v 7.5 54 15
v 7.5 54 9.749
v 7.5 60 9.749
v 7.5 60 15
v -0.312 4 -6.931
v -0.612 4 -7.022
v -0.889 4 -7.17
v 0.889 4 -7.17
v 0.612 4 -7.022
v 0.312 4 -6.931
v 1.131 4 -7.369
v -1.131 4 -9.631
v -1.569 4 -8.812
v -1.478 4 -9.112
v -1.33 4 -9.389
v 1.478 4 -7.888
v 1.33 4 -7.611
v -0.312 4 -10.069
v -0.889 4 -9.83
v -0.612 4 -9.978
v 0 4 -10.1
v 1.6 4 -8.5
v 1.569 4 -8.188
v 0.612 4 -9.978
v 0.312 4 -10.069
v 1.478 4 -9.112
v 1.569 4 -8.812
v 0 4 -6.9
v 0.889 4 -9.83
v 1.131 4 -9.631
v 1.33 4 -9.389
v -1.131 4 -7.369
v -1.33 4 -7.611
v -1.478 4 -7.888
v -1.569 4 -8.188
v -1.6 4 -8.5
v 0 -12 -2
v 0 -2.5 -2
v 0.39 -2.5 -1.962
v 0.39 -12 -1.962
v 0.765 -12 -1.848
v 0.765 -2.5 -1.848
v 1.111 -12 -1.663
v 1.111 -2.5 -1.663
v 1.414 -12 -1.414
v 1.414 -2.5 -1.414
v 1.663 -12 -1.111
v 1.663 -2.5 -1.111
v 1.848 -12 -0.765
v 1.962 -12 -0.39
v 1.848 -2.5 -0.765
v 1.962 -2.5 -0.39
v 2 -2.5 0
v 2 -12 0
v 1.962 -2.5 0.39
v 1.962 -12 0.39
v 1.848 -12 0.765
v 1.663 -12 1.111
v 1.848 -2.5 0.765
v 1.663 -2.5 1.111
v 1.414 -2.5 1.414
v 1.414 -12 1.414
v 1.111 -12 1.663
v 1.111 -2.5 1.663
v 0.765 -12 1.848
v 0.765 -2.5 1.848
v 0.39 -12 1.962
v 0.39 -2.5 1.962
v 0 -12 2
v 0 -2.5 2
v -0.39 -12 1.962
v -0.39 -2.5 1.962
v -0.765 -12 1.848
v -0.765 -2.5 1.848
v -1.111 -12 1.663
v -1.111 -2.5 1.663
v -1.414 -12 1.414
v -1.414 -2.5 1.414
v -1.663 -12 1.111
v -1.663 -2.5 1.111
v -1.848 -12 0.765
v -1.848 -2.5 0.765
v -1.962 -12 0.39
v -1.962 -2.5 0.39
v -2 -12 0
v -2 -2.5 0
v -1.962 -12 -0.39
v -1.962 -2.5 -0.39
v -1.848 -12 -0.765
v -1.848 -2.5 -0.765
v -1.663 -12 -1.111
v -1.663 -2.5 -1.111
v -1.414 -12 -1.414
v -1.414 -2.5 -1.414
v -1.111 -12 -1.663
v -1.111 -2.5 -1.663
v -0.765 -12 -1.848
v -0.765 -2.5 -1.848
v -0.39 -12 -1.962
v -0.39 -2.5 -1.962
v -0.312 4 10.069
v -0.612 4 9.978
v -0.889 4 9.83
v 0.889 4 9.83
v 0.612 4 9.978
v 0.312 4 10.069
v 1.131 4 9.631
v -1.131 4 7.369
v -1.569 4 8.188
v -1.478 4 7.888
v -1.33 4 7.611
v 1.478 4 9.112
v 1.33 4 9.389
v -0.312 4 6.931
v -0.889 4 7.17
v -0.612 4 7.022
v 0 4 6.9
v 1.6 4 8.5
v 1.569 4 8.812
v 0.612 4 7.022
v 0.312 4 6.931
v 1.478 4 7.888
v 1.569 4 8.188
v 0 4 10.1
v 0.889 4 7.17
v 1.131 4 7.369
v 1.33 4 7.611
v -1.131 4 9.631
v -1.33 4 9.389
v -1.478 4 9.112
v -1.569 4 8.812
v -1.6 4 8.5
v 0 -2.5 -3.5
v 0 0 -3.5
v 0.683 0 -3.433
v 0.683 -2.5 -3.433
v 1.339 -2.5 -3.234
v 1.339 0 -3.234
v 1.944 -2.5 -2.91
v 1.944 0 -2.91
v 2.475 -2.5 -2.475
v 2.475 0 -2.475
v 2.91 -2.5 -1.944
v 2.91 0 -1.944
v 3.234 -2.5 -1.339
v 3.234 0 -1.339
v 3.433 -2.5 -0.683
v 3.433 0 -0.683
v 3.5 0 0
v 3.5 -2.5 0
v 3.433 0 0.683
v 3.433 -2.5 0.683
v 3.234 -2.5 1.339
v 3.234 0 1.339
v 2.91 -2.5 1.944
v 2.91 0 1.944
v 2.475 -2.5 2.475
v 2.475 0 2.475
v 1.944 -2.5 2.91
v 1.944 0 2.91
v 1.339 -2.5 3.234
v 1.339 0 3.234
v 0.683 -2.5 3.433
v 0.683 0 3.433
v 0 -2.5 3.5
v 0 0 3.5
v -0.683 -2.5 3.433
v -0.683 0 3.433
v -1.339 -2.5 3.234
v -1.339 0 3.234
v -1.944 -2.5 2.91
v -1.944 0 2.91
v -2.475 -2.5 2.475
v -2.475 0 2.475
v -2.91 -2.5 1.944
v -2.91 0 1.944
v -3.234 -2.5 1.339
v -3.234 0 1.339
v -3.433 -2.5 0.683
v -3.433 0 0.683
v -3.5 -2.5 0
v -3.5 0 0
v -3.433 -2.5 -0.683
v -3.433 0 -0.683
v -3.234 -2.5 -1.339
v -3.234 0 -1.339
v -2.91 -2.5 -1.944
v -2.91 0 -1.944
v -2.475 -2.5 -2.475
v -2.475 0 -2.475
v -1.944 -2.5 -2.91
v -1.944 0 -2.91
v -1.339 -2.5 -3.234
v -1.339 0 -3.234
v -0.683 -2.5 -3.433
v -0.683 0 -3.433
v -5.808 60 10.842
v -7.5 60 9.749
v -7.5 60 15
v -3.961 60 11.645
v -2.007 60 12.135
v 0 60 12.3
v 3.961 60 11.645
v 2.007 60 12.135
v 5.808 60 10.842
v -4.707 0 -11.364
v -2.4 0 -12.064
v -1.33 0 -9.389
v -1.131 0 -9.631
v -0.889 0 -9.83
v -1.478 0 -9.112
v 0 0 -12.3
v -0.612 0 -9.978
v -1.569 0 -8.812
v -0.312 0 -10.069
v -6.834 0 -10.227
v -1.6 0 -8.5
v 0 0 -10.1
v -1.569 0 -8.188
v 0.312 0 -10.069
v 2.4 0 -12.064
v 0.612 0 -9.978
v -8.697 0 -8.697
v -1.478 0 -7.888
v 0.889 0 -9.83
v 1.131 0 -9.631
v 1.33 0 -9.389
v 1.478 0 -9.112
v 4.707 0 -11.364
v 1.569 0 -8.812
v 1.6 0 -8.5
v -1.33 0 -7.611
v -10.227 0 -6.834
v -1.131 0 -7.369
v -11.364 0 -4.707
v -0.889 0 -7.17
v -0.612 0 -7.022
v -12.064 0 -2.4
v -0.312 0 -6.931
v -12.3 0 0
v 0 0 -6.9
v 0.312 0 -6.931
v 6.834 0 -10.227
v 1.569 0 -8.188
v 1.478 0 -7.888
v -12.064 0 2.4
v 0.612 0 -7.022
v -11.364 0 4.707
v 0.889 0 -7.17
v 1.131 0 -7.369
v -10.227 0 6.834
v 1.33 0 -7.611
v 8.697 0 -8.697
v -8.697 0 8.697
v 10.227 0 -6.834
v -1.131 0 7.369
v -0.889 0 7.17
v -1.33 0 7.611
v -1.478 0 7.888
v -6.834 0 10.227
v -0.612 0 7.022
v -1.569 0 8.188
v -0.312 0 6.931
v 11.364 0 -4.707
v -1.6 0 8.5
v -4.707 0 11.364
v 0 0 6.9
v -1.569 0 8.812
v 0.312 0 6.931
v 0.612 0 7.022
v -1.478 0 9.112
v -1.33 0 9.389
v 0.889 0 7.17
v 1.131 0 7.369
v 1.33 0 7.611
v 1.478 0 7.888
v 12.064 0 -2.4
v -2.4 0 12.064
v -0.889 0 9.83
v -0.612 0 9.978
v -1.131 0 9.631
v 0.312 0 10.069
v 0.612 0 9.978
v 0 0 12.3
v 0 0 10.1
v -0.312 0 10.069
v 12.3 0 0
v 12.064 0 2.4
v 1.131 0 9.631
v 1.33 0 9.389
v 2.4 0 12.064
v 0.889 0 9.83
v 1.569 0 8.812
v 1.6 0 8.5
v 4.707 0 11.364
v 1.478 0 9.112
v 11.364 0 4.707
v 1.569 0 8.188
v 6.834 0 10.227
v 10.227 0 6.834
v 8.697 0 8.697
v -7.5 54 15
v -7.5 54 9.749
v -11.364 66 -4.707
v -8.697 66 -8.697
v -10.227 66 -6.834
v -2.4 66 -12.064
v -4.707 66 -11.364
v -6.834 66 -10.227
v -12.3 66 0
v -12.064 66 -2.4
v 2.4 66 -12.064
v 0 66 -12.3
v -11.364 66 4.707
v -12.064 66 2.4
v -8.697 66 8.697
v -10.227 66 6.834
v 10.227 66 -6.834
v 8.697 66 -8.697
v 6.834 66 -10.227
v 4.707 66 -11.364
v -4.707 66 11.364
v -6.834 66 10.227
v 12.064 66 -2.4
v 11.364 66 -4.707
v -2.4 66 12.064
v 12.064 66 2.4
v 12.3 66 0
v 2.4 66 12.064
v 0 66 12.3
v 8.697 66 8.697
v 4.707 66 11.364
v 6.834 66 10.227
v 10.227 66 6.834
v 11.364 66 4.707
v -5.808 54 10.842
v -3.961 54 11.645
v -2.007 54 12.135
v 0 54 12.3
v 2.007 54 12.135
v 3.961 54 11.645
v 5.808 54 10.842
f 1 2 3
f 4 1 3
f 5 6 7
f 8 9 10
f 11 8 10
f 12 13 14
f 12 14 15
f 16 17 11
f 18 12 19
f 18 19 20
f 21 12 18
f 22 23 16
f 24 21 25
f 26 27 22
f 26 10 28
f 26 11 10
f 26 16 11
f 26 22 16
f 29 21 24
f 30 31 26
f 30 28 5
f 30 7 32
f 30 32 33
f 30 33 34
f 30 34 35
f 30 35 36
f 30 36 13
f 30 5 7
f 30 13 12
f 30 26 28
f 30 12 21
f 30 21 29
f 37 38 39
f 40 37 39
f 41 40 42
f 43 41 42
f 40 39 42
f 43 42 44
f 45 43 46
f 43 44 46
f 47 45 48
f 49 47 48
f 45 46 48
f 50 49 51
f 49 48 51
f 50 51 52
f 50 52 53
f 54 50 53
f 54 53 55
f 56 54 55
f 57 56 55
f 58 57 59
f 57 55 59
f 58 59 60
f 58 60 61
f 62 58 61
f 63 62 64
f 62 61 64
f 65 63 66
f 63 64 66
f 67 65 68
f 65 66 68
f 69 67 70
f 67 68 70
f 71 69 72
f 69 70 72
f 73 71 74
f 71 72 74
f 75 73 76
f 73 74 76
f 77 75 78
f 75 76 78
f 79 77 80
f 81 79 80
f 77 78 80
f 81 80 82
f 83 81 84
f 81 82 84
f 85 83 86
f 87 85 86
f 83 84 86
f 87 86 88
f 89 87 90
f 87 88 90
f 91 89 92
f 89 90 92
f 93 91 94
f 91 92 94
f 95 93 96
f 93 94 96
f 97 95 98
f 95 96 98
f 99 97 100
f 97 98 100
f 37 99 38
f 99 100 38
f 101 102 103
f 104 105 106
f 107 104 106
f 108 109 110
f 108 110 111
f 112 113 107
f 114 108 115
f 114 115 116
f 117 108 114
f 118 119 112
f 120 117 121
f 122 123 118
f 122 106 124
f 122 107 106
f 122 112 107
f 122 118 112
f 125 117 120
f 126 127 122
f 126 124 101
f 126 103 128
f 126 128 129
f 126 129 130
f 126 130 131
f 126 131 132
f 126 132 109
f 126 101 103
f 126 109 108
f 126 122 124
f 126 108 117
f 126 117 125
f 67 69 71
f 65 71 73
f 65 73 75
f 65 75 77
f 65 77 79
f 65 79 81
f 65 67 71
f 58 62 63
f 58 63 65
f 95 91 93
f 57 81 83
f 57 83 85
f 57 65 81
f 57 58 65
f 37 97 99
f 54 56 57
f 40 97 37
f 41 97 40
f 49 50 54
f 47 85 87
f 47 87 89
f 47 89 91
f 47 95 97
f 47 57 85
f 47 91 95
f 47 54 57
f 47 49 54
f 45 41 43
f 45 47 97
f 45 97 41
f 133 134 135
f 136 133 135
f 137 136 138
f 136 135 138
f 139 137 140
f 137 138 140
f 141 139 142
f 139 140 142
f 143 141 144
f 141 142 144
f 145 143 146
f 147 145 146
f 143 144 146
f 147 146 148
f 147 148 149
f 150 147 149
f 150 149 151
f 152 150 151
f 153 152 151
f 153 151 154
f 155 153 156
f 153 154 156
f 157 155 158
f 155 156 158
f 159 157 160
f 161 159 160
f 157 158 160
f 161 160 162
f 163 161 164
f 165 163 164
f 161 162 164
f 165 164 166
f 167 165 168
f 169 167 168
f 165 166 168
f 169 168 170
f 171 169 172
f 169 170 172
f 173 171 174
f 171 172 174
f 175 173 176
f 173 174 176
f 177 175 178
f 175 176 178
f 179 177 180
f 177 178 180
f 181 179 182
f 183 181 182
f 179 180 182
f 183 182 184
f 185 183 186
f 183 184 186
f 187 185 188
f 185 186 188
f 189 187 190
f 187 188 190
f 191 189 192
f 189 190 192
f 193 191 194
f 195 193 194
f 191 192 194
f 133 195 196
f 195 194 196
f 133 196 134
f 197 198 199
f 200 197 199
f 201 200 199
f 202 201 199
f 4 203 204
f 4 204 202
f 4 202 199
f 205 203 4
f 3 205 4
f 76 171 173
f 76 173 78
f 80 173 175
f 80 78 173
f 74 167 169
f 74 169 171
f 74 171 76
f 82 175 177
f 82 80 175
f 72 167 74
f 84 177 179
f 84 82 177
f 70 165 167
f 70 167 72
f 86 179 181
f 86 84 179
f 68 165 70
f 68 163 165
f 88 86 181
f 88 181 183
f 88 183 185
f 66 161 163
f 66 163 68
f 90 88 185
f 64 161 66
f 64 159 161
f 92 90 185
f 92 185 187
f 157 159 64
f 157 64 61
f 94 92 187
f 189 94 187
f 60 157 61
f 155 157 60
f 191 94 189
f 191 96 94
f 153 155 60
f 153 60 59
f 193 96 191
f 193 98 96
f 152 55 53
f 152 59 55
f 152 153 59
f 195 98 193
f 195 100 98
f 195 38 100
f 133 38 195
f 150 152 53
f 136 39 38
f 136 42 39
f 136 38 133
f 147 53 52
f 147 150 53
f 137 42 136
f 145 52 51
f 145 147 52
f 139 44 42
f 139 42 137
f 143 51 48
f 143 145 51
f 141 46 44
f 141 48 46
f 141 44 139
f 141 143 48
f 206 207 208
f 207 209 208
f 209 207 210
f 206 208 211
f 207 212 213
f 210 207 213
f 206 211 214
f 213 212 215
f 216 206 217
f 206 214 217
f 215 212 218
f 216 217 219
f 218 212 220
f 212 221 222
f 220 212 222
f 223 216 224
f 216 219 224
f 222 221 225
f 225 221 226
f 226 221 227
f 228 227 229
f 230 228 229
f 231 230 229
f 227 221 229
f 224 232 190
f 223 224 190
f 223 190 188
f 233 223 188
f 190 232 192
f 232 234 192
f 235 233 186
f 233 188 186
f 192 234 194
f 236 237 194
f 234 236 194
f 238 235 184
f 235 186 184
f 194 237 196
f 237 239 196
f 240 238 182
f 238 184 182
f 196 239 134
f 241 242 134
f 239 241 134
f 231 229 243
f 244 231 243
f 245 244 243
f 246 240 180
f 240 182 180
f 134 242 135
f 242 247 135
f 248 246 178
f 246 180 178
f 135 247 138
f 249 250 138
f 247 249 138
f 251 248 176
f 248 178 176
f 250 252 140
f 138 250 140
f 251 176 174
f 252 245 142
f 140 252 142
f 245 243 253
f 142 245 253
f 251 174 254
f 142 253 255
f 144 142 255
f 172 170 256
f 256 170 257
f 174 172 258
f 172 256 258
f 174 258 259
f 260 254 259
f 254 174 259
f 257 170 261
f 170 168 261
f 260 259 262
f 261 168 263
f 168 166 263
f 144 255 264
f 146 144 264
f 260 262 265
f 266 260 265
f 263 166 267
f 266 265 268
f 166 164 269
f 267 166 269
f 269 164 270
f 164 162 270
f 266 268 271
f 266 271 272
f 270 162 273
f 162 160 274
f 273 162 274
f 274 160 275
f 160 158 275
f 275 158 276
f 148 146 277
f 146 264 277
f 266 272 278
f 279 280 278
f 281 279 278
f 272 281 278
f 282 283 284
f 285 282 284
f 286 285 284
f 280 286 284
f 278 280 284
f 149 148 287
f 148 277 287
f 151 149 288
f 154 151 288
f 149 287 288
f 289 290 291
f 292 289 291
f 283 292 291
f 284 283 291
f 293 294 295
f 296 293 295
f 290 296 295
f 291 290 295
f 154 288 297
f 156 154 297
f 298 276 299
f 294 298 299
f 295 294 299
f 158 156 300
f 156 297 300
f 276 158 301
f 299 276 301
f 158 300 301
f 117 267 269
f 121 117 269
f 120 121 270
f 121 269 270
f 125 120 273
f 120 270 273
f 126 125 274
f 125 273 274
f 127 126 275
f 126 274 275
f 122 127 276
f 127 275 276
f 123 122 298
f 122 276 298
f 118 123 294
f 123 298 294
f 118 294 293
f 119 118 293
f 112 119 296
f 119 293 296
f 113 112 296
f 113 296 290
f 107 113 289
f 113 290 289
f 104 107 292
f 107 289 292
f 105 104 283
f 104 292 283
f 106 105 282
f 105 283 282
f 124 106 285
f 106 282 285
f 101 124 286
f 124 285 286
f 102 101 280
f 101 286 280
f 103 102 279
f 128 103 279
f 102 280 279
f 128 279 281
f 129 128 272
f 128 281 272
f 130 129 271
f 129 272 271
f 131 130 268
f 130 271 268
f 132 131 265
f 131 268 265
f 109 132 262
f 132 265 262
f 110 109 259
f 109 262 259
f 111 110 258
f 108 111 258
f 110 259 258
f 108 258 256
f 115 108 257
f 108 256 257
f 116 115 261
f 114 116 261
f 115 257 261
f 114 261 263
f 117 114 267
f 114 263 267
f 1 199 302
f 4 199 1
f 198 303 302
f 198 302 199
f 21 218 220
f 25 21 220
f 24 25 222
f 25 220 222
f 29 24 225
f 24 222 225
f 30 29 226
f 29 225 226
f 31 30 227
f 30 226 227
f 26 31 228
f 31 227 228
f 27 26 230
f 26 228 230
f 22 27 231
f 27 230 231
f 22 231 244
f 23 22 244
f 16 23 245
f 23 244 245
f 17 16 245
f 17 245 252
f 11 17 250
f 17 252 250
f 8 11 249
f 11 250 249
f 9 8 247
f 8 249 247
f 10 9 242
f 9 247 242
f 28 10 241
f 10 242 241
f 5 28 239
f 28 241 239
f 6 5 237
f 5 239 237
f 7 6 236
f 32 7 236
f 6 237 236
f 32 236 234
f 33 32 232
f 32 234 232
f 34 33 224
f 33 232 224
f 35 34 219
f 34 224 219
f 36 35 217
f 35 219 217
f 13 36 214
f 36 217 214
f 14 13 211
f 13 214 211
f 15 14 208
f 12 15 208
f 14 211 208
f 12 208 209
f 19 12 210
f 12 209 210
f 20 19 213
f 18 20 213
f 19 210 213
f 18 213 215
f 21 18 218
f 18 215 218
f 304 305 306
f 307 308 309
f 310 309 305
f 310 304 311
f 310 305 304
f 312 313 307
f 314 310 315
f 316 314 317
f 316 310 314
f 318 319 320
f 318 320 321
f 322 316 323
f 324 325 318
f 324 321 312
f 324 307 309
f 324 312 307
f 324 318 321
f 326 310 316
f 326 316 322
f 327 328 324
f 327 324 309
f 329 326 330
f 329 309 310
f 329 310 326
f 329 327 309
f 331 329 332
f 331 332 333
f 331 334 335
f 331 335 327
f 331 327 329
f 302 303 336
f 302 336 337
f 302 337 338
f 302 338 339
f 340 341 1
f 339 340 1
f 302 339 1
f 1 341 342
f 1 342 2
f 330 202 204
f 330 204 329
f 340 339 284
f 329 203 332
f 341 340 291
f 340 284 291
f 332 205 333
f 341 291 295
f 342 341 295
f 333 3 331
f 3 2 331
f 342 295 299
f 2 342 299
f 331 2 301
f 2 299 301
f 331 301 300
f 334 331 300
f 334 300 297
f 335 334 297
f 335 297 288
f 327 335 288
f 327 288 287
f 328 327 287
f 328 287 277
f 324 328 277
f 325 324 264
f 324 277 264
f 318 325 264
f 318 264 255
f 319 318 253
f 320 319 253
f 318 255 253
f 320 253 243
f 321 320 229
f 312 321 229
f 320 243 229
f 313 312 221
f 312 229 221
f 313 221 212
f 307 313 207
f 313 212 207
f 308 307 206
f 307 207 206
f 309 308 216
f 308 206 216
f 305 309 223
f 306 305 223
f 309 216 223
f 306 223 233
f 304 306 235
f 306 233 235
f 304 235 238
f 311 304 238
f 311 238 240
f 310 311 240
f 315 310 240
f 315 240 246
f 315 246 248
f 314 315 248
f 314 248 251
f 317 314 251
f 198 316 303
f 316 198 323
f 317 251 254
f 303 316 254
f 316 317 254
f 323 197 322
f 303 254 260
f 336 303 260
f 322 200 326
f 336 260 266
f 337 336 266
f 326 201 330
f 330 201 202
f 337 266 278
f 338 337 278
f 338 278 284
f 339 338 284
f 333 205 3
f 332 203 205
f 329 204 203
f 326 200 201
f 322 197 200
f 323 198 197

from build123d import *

# Parameters (mm, degrees)
SKETCH_1_R          = 12.3
EXTRUDE_1_DEPTH     = 66
SKETCH_2_W          = 15
SKETCH_2_H          = 6
EXTRUDE_2_DEPTH     = 10
SKETCH_3_R          = 3.5
EXTRUDE_3_DEPTH     = 2.5
SKETCH_4_R          = 2
EXTRUDE_4_DEPTH     = 9.5
SKETCH_5_R          = 1.6
CUT_EXTRUDE_1_DEPTH = 4


with BuildPart() as part:
    # 草图1 → 凸台-拉伸1 (new body)
    with BuildSketch(Plane(origin=(0, 0, 0), x_dir=(1, 0, 0), z_dir=(0, 1, 0))):
        with Locations(Location((0, 0, 0), (0, 0, 270))):
            Circle(SKETCH_1_R)
    extrude(amount=EXTRUDE_1_DEPTH)

    # 草图2 → 凸台-拉伸2 (add)
    with BuildSketch(Plane.XY.offset(5)):
        with Locations((0, 57)):
            Rectangle(SKETCH_2_W, SKETCH_2_H)
    extrude(amount=EXTRUDE_2_DEPTH)

    # 草图3 → 凸台-拉伸3 (add)
    with BuildSketch(Plane.XZ):
        with Locations(Location((0, 0, 0), (0, 0, 270))):
            Circle(SKETCH_3_R)
    extrude(amount=EXTRUDE_3_DEPTH)

    # 草图4 → 凸台-拉伸4 (add)
    with BuildSketch(Plane.XZ.offset(2.5)):
        with Locations(Location((0, 0, 0), (0, 0, 270))):
            Circle(SKETCH_4_R)
    extrude(amount=EXTRUDE_4_DEPTH)

    # 草图5 → 切除-拉伸1 (cut)
    with BuildSketch(Plane.XZ):
        with Locations(Location((0, 8.5, 0), (0, 0, 270))):
            Circle(SKETCH_5_R)
        with Locations(Location((0, -8.5, 0), (0, 0, 270))):
            Circle(SKETCH_5_R)
    extrude(amount=-CUT_EXTRUDE_1_DEPTH, mode=Mode.SUBTRACT)


solid = part.part
